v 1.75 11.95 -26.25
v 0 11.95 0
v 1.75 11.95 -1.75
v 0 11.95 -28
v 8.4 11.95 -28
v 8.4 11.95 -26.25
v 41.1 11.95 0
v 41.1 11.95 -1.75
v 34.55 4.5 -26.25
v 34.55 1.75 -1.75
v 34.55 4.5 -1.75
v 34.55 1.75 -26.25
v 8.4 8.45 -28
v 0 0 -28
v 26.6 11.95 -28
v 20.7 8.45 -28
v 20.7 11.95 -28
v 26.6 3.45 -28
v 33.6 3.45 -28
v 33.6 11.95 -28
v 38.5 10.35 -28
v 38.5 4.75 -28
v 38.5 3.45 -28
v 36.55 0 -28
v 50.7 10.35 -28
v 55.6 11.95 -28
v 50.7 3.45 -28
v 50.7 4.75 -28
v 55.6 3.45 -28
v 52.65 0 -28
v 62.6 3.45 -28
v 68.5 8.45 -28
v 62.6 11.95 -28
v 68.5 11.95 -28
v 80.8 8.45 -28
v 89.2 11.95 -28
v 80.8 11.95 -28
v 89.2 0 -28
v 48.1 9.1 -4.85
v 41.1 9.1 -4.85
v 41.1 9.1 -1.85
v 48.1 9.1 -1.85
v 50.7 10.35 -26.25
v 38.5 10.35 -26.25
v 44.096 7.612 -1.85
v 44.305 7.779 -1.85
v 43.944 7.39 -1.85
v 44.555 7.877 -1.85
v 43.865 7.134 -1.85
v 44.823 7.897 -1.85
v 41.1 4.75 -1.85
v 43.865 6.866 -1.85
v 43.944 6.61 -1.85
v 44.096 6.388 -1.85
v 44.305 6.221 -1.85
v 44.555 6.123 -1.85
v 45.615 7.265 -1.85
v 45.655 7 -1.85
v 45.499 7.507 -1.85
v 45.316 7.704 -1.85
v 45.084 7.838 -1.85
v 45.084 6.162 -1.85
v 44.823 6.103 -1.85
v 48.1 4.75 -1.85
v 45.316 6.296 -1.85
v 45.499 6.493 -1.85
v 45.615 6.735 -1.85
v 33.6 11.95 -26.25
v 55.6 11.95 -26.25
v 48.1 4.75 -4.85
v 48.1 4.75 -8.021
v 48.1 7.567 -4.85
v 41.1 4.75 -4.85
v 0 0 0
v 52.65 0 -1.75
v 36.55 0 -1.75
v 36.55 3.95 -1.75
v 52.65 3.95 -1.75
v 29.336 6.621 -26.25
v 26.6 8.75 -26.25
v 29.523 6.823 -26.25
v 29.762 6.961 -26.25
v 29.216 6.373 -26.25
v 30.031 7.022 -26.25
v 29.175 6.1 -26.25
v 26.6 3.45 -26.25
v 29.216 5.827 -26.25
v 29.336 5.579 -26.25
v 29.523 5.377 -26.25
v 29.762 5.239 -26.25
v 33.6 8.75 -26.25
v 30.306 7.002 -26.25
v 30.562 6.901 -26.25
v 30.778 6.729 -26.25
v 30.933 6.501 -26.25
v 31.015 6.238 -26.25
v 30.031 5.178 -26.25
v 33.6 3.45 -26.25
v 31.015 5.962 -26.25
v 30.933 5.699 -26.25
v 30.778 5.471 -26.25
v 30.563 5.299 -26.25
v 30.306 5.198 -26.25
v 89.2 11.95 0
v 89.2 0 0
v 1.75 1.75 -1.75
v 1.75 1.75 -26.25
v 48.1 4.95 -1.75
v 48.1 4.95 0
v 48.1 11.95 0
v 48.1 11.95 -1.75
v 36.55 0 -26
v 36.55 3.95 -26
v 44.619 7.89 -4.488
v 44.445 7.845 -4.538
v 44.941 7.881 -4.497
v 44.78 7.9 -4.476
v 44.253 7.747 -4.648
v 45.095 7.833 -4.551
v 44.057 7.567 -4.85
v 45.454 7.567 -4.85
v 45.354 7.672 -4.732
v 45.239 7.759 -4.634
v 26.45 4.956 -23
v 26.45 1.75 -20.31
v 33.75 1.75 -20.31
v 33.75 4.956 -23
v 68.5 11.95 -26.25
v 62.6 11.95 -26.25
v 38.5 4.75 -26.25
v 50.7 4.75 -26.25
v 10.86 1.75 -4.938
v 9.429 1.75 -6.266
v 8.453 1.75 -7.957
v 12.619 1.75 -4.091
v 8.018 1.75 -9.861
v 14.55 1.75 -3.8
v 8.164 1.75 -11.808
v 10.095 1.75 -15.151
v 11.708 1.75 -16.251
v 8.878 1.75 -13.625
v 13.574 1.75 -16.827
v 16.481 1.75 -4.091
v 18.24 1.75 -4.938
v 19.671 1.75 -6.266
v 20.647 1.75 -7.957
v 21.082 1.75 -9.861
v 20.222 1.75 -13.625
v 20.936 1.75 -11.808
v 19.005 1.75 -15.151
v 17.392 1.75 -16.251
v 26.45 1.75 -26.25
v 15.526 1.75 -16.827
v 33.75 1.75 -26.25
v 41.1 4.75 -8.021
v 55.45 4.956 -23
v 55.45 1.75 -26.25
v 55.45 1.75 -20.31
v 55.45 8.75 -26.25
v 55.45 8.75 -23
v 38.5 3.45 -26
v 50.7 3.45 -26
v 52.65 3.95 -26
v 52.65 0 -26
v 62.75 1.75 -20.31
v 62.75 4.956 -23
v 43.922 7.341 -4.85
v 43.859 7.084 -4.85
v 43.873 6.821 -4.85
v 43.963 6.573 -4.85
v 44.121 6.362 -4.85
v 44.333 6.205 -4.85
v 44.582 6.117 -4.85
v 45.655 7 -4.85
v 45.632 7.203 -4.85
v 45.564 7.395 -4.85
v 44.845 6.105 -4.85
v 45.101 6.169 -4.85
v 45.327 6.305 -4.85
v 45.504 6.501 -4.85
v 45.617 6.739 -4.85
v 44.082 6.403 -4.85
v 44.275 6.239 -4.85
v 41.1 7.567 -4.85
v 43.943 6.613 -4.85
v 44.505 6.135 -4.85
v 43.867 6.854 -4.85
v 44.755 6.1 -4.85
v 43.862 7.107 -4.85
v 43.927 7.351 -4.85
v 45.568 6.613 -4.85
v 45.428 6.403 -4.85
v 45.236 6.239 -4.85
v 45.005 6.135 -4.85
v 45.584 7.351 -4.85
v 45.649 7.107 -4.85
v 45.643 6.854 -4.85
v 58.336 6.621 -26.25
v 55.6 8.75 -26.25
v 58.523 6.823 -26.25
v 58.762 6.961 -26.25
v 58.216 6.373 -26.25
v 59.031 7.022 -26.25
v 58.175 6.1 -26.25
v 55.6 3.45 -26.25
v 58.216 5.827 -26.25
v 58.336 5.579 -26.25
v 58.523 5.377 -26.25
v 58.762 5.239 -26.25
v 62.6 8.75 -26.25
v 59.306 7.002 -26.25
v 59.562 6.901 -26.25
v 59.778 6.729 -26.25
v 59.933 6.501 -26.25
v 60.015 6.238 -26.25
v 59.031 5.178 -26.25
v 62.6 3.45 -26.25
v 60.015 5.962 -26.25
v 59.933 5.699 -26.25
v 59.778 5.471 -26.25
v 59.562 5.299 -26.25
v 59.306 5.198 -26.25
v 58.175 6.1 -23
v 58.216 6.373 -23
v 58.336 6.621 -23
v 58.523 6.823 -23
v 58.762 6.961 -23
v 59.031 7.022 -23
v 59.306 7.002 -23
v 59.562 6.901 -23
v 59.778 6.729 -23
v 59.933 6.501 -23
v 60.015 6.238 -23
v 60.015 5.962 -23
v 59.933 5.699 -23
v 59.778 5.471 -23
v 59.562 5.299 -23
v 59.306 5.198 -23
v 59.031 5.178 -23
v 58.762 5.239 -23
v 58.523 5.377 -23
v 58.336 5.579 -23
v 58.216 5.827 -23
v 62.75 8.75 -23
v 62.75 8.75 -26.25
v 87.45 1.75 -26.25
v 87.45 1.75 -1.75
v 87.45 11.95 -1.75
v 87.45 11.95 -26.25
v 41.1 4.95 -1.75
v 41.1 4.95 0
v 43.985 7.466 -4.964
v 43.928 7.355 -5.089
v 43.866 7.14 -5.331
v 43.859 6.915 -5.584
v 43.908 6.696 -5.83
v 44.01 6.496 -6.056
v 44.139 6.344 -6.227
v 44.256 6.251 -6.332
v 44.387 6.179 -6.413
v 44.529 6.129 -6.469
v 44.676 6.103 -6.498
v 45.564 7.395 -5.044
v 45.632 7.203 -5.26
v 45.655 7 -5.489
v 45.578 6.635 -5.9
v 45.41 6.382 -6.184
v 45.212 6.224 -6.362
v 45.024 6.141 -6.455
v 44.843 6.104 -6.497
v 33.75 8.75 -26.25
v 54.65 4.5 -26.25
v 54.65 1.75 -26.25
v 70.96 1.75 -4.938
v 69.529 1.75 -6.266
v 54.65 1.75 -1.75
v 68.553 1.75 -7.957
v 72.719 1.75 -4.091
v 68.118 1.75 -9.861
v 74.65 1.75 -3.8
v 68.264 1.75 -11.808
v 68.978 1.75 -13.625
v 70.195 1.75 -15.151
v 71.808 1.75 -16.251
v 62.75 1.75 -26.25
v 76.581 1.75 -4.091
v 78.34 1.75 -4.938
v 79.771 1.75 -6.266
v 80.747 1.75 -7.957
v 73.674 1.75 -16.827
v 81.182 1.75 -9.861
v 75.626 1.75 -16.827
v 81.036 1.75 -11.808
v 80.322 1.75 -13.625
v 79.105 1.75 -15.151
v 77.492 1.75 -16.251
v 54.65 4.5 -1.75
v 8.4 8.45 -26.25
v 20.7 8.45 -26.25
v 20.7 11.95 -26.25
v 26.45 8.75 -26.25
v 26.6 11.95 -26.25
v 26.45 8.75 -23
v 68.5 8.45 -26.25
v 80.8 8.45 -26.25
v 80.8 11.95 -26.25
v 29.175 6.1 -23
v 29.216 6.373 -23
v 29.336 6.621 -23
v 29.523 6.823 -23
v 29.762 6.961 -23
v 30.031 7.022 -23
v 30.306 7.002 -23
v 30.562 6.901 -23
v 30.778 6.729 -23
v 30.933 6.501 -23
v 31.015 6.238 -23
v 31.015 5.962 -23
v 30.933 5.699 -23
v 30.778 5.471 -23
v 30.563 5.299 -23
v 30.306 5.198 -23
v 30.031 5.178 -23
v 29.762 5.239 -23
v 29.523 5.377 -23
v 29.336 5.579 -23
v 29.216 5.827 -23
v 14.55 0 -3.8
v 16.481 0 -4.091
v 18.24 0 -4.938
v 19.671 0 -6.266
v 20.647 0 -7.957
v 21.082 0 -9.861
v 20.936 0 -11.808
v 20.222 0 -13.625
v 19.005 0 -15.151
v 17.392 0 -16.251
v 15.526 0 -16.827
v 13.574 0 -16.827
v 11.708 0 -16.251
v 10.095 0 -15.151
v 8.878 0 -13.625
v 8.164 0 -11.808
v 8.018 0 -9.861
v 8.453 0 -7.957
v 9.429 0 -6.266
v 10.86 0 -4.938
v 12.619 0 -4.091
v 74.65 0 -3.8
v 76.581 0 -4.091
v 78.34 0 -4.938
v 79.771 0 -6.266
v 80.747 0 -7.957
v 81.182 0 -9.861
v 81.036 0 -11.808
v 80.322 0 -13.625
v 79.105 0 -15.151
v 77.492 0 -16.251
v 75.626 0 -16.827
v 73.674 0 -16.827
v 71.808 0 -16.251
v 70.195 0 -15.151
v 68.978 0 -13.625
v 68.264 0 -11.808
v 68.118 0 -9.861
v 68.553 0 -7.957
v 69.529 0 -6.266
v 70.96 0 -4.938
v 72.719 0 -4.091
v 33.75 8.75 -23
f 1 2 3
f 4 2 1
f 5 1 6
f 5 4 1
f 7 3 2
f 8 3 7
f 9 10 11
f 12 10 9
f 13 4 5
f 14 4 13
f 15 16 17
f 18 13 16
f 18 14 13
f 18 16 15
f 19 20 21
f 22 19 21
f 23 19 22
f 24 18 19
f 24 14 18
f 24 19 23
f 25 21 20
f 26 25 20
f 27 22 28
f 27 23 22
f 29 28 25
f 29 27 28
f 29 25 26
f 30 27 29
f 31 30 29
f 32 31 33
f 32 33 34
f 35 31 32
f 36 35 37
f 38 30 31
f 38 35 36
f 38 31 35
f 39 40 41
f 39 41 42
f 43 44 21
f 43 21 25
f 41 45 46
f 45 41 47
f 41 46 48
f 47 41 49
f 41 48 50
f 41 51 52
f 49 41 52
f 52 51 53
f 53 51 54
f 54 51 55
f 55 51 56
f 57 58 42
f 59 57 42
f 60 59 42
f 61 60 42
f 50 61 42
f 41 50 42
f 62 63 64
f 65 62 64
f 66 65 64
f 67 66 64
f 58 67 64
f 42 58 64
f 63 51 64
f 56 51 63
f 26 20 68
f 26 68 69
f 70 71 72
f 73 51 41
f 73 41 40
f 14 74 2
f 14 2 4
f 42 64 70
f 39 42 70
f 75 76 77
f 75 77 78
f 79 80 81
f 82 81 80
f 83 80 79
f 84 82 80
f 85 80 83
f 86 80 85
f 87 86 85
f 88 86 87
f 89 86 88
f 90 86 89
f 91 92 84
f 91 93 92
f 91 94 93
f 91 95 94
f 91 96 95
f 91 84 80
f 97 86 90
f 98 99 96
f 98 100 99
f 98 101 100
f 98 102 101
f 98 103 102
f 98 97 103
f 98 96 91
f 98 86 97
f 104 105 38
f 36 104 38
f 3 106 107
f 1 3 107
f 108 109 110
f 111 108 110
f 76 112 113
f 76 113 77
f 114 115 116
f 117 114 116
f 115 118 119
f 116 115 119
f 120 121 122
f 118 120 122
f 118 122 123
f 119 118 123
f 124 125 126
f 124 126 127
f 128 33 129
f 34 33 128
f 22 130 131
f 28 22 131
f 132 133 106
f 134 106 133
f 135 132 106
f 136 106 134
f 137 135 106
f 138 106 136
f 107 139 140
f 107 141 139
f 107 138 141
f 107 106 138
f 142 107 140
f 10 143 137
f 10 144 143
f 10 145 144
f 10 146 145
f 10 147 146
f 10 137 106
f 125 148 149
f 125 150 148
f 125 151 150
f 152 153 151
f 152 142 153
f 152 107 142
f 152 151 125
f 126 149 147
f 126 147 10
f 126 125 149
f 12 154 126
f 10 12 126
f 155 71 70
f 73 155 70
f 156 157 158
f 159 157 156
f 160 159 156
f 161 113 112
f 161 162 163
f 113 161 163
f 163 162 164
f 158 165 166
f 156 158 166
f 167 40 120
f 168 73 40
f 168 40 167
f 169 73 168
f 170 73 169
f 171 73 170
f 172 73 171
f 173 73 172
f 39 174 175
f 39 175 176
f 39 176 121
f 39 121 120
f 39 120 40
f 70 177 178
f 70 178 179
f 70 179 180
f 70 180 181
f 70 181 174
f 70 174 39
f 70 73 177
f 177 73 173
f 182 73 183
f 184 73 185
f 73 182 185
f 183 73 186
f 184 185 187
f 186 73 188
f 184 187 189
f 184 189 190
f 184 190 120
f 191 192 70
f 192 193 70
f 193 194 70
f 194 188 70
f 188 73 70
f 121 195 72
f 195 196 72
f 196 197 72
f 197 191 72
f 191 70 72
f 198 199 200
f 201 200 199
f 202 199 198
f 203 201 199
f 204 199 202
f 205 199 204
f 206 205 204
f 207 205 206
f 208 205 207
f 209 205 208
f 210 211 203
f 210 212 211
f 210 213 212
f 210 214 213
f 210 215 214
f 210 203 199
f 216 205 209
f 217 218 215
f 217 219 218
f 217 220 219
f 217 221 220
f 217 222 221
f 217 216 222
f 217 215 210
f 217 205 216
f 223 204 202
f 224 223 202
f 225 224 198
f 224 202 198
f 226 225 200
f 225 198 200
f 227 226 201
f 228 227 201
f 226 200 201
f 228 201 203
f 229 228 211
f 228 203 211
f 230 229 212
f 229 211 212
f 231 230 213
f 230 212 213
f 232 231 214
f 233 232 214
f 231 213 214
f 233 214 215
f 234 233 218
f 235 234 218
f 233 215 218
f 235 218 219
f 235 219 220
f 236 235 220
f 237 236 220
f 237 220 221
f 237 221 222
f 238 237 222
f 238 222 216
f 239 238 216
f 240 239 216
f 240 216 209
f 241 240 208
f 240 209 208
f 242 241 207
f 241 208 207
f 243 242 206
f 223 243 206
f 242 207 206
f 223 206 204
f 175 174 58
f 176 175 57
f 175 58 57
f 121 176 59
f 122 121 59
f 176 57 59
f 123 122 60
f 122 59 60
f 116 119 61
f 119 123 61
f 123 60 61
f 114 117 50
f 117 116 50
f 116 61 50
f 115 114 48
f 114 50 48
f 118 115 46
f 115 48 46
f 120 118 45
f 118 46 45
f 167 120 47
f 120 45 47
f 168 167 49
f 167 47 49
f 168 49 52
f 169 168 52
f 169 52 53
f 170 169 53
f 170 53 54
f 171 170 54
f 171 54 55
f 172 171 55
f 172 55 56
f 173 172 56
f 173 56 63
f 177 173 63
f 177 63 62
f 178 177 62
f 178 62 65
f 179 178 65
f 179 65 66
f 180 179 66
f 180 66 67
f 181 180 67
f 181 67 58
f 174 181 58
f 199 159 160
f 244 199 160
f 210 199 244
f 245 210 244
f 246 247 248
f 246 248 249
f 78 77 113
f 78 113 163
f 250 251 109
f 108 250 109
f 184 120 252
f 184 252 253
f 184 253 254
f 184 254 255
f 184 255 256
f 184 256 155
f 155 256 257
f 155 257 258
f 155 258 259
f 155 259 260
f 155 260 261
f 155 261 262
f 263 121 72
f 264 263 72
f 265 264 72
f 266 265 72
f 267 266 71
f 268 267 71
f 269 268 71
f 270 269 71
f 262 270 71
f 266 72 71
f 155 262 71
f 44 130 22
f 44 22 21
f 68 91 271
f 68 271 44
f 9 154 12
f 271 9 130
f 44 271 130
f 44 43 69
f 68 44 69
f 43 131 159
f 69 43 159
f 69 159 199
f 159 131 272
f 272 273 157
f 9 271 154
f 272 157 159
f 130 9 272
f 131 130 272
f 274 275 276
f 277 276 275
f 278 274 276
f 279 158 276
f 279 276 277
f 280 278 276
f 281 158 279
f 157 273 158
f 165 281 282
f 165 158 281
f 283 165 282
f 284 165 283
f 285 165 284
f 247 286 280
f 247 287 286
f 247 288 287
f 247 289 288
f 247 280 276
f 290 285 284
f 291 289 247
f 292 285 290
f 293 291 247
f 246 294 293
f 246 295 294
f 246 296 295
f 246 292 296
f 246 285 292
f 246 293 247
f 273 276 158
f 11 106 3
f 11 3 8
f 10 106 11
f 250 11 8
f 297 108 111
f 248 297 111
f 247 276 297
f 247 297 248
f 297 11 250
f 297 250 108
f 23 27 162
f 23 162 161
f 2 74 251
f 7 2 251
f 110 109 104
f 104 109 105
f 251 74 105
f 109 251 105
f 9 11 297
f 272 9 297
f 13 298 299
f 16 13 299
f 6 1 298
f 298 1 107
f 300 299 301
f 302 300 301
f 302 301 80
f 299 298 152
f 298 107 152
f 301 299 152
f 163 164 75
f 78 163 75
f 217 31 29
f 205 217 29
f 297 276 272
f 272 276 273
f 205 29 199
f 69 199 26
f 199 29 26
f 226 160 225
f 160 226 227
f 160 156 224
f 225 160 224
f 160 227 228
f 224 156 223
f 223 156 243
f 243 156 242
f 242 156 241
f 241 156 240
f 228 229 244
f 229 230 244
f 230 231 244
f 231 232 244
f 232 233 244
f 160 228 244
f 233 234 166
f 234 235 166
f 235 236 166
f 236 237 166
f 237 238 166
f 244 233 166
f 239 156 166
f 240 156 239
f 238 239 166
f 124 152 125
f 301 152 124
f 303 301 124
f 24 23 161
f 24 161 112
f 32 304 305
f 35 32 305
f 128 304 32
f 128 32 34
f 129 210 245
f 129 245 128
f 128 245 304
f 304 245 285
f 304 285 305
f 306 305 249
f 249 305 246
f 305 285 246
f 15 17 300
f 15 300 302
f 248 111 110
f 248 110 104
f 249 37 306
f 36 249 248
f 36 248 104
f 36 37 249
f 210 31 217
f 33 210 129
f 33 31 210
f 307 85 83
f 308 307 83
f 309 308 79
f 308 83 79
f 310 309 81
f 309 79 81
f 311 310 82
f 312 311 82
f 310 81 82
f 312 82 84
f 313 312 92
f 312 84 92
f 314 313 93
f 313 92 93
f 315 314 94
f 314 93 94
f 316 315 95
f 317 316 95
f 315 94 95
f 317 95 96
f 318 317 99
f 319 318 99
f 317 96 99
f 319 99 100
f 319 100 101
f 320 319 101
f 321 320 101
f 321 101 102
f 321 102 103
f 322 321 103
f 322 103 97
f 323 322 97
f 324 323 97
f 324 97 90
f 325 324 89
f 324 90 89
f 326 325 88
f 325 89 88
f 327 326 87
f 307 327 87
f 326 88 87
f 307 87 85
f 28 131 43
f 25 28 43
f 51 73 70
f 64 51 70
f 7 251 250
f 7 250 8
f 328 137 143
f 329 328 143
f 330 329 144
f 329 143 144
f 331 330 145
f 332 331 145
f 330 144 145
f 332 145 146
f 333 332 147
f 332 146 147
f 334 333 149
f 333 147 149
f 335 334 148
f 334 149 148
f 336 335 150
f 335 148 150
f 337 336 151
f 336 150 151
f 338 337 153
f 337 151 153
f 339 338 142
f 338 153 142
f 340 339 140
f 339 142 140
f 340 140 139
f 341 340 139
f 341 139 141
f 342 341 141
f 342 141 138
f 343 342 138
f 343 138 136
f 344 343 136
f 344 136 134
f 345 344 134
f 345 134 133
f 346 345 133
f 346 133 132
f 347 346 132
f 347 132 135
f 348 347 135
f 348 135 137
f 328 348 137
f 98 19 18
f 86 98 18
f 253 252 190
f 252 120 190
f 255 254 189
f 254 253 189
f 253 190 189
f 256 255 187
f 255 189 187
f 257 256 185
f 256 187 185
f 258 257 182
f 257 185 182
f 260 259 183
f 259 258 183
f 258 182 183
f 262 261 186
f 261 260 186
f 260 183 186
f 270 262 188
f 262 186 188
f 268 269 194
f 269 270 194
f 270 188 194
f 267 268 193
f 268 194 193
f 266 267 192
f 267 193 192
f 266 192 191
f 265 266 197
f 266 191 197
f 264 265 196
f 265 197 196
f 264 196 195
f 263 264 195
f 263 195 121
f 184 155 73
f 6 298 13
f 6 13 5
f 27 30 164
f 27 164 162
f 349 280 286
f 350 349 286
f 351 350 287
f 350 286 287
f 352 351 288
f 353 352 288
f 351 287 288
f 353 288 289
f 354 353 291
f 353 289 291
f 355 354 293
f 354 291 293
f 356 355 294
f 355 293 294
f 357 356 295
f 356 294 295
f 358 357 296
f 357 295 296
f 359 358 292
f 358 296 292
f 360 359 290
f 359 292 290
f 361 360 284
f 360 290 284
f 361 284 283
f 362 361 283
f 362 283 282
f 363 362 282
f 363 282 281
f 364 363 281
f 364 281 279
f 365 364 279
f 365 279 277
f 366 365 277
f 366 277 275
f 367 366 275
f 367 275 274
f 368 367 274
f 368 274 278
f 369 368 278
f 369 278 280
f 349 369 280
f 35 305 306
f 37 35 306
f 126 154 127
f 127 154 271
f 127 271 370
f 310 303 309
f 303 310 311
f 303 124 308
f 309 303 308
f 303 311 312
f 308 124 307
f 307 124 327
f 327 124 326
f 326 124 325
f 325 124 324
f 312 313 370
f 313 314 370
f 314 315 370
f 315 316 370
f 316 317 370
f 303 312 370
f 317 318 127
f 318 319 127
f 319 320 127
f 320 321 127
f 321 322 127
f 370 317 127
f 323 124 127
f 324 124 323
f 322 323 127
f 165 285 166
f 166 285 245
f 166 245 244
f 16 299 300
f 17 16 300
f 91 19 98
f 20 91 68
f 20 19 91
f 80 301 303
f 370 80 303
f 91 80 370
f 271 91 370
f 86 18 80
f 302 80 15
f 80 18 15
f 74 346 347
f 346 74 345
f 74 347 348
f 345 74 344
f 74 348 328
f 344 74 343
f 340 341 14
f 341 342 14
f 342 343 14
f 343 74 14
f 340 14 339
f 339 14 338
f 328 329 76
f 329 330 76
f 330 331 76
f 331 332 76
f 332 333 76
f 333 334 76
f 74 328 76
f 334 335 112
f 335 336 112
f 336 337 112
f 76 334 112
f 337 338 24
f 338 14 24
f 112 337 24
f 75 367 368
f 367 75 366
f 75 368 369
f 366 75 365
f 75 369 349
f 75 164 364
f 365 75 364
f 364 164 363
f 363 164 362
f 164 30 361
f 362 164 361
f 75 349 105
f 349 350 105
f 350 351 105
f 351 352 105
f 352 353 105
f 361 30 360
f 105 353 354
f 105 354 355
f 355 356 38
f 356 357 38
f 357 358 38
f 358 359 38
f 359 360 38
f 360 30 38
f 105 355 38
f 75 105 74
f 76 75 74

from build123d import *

# Parameters (mm, degrees)
SKETCH1_W            = 89.2
SKETCH1_H            = 28
BOSS_EXTRUDE1_DEPTH  = 11.95
SHELL1_T             = -1.75
SKETCH2_R            = 6.55
CUT_EXTRUDE1_DEPTH   = 95.04615888
SKETCH3_W            = 12.3
SKETCH3_H            = 3.5
CUT_EXTRUDE2_DEPTH   = 11.95
SKETCH4_W            = 12.2
SKETCH4_H            = 5.6
CUT_EXTRUDE3_DEPTH   = 11.95
SKETCH5_W            = 20.1
SKETCH5_H            = 24.5
BOSS_EXTRUDE2_DEPTH  = 2.75
SKETCH6_W            = 16.1
SKETCH6_H            = 24.25
CUT_EXTRUDE4_DEPTH   = 3.95
CUT_EXTRUDE6_DEPTH   = 2
CUT_EXTRUDE10_REACH  = 96.252
SKETCH14_W           = 7
SKETCH14_H           = 7
SKETCH15_W           = 7
SKETCH15_H           = 3
BOSS_EXTRUDE3_DEPTH  = 4.35
BOSS_EXTRUDE5_DEPTH  = 7
SKETCH17_W           = 7
SKETCH17_H           = 8.5
CUT_EXTRUDE11_DEPTH  = 1.75
SKETCH18_W           = 7.3
SKETCH18_H           = 3.25
BOSS_EXTRUDE6_DEPTH  = 7
SKETCH20_R           = 0.925
CUT_EXTRUDE12_DEPTH  = 3.25
CUT_EXTRUDE14_REACH  = 95.719
SKETCH26_R           = 0.9
BOSS_EXTRUDE9_DEPTH  = 7.3
BOSS_EXTRUDE10_DEPTH = 7.3


with BuildPart() as part:
    # Sketch1 → Boss-Extrude1 (new body)
    with BuildSketch(Plane(origin=(0, 0, 0), x_dir=(1, 0, 0), z_dir=(0, 1, 0))):
        with Locations((44.6, 14)):
            Rectangle(SKETCH1_W, SKETCH1_H)
    extrude(amount=BOSS_EXTRUDE1_DEPTH)

    # Shell1
    shell1_openings = [part.faces().sort_by_distance(p)[0] for p in [
        (44.6, 11.95, -14),
    ]]
    offset(amount=SHELL1_T, openings=shell1_openings, kind=Kind.INTERSECTION)

    # Sketch2 → Cut-Extrude1 (cut, through all)
    with BuildSketch(Plane(origin=(0, 1.75, 0), x_dir=(1, 0, 0), z_dir=(0, 1, 0))):
        with Locations(Location((14.55, 10.35, 0), (0, 0, 270))):
            Circle(SKETCH2_R)
        with Locations(Location((74.65, 10.35, 0), (0, 0, 270))):
            Circle(SKETCH2_R)
    extrude(amount=-CUT_EXTRUDE1_DEPTH, mode=Mode.SUBTRACT)

    # Sketch3 → Cut-Extrude2 (cut)
    with BuildSketch(Plane.XY.offset(-26.25)):
        with Locations((14.55, 10.2)):
            Rectangle(SKETCH3_W, SKETCH3_H)
        with Locations((74.65, 10.2)):
            Rectangle(SKETCH3_W, SKETCH3_H)
    extrude(amount=-CUT_EXTRUDE2_DEPTH, mode=Mode.SUBTRACT)

    # Sketch4 → Cut-Extrude3 (cut)
    with BuildSketch(Plane.XY.offset(-26.25)):
        with Locations((44.6, 7.55)):
            Rectangle(SKETCH4_W, SKETCH4_H)
    extrude(amount=-CUT_EXTRUDE3_DEPTH, mode=Mode.SUBTRACT)

    # Sketch5 → Boss-Extrude2 (add)
    with BuildSketch(Plane(origin=(0, 1.75, 0), x_dir=(1, 0, 0), z_dir=(0, 1, 0))):
        with Locations((44.6, 14)):
            Rectangle(SKETCH5_W, SKETCH5_H)
    extrude(amount=BOSS_EXTRUDE2_DEPTH)

    # Sketch6 → Cut-Extrude4 (cut)
    with BuildSketch(Plane.XZ):
        with Locations((44.6, -13.875)):
            Rectangle(SKETCH6_W, SKETCH6_H)
    extrude(amount=-CUT_EXTRUDE4_DEPTH, mode=Mode.SUBTRACT)

    # Sketch8 → Cut-Extrude6 (cut)
    with BuildSketch(Plane(origin=(0, 0, -28), x_dir=(-1, 0, 0), z_dir=(0, 0, -1))):
        Polygon((-50.7, 3.45), (-38.5, 3.45), (-36.55, 0), (-52.65, 0), align=None)
    extrude(amount=-CUT_EXTRUDE6_DEPTH, mode=Mode.SUBTRACT)

    # Sketch14 → Cut-Extrude10 (cut, up to next)
    with BuildSketch(Plane.XY, mode=Mode.PRIVATE) as cut_extrude10_sk1:
        with Locations((44.6, 8.45)):
            Rectangle(SKETCH14_W, SKETCH14_H)
    cut_extrude10_tool1 = extrude(cut_extrude10_sk1.sketch, amount=-CUT_EXTRUDE10_REACH, mode=Mode.PRIVATE) & part.part
    add(cut_extrude10_tool1.solids().sort_by_distance((44.6, 8.45, 0))[0], mode=Mode.SUBTRACT)

    # Sketch17 → Cut-Extrude11 (cut)
    with BuildSketch(Plane(origin=(0, 0, -28), x_dir=(-1, 0, 0), z_dir=(0, 0, -1))):
        with Locations((-59.1, 7.7)):
            Rectangle(SKETCH17_W, SKETCH17_H)
        with Locations((-30.1, 7.7)):
            Rectangle(SKETCH17_W, SKETCH17_H)
    extrude(amount=-CUT_EXTRUDE11_DEPTH, mode=Mode.SUBTRACT)

    # Sketch18 → Boss-Extrude6 (add)
    with BuildSketch(Plane(origin=(0, 1.75, 0), x_dir=(1, 0, 0), z_dir=(0, 1, 0))):
        with Locations((59.1, 24.625)):
            Rectangle(SKETCH18_W, SKETCH18_H)
        with Locations((30.1, 24.625)):
            Rectangle(SKETCH18_W, SKETCH18_H)
    extrude(amount=BOSS_EXTRUDE6_DEPTH)

    # Sketch20 → Cut-Extrude12 (cut)
    with BuildSketch(Plane(origin=(0, 0, -26.25), x_dir=(-1, 0, 0), z_dir=(0, 0, -1))):
        with Locations((-59.1, 6.1)):
            Circle(SKETCH20_R)
        with Locations((-30.1, 6.1)):
            Circle(SKETCH20_R)
    extrude(amount=-CUT_EXTRUDE12_DEPTH, mode=Mode.SUBTRACT)

    # Sketch27 → Boss-Extrude9 (add)
    with BuildSketch(Plane.ZY.offset(-26.45)):
        Polygon((-23, 1.75), (-20.31, 1.75), (-23, 4.955817164), align=None)
    extrude(amount=-BOSS_EXTRUDE9_DEPTH)

    # Sketch28 → Boss-Extrude10 (add)
    with BuildSketch(Plane(origin=(62.75, 0, 0), x_dir=(0, 0, -1), z_dir=(1, 0, 0))):
        Polygon((23, 1.75), (20.31, 1.75), (23, 4.955817164), align=None)
    extrude(amount=-BOSS_EXTRUDE10_DEPTH)


with BuildPart() as body_2:
    # Sketch15 → Boss-Extrude3 (new body)
    with BuildSketch(Plane(origin=(0, 4.75, 0), x_dir=(1, 0, 0), z_dir=(0, 1, 0))):
        with Locations((44.6, 3.35)):
            Rectangle(SKETCH15_W, SKETCH15_H)
    extrude(amount=BOSS_EXTRUDE3_DEPTH)


with BuildPart() as body_3:
    # Sketch16 → Boss-Extrude5 (new body)
    with BuildSketch(Plane(origin=(48.1, 0, 0), x_dir=(0, 0, -1), z_dir=(1, 0, 0))):
        Polygon((4.85, 7.567485507), (8.020929785, 4.75), (4.85, 4.75), align=None)
    extrude(amount=-BOSS_EXTRUDE5_DEPTH)


with BuildPart() as cut_extrude14_tool:
    # Cut-Extrude14: up to this plane
    cut_extrude14_end = Plane(origin=(36.85818196, 7.567485507, -4.85), z_dir=(0, 0.7475402658182556, -0.6642164940592575))
    # Sketch26 → Cut-Extrude14 (new, up to the surface)
    with BuildSketch(Plane.XY.offset(-1.85), mode=Mode.PRIVATE) as cut_extrude14_sk1:
        with Locations((44.755335946, 7)):
            Circle(SKETCH26_R)
    cut_extrude14_tool1 = split(extrude(cut_extrude14_sk1.sketch, amount=-CUT_EXTRUDE14_REACH, mode=Mode.PRIVATE), bisect_by=cut_extrude14_end, keep=Keep.BOTH, mode=Mode.PRIVATE)
    add(cut_extrude14_tool1.solids().sort_by_distance((44.755336, 7, -1.85))[0])


with BuildPart() as body_2_1:
    add(body_2.part)

    # Cut-Extrude14: cut by cut_extrude14_tool
    add(cut_extrude14_tool.part, mode=Mode.SUBTRACT)


with BuildPart() as body_3_1:
    add(body_3.part)

    # Cut-Extrude14: cut by cut_extrude14_tool
    add(cut_extrude14_tool.part, mode=Mode.SUBTRACT)


solid = Compound([part.part, body_2_1.part, body_3_1.part])
